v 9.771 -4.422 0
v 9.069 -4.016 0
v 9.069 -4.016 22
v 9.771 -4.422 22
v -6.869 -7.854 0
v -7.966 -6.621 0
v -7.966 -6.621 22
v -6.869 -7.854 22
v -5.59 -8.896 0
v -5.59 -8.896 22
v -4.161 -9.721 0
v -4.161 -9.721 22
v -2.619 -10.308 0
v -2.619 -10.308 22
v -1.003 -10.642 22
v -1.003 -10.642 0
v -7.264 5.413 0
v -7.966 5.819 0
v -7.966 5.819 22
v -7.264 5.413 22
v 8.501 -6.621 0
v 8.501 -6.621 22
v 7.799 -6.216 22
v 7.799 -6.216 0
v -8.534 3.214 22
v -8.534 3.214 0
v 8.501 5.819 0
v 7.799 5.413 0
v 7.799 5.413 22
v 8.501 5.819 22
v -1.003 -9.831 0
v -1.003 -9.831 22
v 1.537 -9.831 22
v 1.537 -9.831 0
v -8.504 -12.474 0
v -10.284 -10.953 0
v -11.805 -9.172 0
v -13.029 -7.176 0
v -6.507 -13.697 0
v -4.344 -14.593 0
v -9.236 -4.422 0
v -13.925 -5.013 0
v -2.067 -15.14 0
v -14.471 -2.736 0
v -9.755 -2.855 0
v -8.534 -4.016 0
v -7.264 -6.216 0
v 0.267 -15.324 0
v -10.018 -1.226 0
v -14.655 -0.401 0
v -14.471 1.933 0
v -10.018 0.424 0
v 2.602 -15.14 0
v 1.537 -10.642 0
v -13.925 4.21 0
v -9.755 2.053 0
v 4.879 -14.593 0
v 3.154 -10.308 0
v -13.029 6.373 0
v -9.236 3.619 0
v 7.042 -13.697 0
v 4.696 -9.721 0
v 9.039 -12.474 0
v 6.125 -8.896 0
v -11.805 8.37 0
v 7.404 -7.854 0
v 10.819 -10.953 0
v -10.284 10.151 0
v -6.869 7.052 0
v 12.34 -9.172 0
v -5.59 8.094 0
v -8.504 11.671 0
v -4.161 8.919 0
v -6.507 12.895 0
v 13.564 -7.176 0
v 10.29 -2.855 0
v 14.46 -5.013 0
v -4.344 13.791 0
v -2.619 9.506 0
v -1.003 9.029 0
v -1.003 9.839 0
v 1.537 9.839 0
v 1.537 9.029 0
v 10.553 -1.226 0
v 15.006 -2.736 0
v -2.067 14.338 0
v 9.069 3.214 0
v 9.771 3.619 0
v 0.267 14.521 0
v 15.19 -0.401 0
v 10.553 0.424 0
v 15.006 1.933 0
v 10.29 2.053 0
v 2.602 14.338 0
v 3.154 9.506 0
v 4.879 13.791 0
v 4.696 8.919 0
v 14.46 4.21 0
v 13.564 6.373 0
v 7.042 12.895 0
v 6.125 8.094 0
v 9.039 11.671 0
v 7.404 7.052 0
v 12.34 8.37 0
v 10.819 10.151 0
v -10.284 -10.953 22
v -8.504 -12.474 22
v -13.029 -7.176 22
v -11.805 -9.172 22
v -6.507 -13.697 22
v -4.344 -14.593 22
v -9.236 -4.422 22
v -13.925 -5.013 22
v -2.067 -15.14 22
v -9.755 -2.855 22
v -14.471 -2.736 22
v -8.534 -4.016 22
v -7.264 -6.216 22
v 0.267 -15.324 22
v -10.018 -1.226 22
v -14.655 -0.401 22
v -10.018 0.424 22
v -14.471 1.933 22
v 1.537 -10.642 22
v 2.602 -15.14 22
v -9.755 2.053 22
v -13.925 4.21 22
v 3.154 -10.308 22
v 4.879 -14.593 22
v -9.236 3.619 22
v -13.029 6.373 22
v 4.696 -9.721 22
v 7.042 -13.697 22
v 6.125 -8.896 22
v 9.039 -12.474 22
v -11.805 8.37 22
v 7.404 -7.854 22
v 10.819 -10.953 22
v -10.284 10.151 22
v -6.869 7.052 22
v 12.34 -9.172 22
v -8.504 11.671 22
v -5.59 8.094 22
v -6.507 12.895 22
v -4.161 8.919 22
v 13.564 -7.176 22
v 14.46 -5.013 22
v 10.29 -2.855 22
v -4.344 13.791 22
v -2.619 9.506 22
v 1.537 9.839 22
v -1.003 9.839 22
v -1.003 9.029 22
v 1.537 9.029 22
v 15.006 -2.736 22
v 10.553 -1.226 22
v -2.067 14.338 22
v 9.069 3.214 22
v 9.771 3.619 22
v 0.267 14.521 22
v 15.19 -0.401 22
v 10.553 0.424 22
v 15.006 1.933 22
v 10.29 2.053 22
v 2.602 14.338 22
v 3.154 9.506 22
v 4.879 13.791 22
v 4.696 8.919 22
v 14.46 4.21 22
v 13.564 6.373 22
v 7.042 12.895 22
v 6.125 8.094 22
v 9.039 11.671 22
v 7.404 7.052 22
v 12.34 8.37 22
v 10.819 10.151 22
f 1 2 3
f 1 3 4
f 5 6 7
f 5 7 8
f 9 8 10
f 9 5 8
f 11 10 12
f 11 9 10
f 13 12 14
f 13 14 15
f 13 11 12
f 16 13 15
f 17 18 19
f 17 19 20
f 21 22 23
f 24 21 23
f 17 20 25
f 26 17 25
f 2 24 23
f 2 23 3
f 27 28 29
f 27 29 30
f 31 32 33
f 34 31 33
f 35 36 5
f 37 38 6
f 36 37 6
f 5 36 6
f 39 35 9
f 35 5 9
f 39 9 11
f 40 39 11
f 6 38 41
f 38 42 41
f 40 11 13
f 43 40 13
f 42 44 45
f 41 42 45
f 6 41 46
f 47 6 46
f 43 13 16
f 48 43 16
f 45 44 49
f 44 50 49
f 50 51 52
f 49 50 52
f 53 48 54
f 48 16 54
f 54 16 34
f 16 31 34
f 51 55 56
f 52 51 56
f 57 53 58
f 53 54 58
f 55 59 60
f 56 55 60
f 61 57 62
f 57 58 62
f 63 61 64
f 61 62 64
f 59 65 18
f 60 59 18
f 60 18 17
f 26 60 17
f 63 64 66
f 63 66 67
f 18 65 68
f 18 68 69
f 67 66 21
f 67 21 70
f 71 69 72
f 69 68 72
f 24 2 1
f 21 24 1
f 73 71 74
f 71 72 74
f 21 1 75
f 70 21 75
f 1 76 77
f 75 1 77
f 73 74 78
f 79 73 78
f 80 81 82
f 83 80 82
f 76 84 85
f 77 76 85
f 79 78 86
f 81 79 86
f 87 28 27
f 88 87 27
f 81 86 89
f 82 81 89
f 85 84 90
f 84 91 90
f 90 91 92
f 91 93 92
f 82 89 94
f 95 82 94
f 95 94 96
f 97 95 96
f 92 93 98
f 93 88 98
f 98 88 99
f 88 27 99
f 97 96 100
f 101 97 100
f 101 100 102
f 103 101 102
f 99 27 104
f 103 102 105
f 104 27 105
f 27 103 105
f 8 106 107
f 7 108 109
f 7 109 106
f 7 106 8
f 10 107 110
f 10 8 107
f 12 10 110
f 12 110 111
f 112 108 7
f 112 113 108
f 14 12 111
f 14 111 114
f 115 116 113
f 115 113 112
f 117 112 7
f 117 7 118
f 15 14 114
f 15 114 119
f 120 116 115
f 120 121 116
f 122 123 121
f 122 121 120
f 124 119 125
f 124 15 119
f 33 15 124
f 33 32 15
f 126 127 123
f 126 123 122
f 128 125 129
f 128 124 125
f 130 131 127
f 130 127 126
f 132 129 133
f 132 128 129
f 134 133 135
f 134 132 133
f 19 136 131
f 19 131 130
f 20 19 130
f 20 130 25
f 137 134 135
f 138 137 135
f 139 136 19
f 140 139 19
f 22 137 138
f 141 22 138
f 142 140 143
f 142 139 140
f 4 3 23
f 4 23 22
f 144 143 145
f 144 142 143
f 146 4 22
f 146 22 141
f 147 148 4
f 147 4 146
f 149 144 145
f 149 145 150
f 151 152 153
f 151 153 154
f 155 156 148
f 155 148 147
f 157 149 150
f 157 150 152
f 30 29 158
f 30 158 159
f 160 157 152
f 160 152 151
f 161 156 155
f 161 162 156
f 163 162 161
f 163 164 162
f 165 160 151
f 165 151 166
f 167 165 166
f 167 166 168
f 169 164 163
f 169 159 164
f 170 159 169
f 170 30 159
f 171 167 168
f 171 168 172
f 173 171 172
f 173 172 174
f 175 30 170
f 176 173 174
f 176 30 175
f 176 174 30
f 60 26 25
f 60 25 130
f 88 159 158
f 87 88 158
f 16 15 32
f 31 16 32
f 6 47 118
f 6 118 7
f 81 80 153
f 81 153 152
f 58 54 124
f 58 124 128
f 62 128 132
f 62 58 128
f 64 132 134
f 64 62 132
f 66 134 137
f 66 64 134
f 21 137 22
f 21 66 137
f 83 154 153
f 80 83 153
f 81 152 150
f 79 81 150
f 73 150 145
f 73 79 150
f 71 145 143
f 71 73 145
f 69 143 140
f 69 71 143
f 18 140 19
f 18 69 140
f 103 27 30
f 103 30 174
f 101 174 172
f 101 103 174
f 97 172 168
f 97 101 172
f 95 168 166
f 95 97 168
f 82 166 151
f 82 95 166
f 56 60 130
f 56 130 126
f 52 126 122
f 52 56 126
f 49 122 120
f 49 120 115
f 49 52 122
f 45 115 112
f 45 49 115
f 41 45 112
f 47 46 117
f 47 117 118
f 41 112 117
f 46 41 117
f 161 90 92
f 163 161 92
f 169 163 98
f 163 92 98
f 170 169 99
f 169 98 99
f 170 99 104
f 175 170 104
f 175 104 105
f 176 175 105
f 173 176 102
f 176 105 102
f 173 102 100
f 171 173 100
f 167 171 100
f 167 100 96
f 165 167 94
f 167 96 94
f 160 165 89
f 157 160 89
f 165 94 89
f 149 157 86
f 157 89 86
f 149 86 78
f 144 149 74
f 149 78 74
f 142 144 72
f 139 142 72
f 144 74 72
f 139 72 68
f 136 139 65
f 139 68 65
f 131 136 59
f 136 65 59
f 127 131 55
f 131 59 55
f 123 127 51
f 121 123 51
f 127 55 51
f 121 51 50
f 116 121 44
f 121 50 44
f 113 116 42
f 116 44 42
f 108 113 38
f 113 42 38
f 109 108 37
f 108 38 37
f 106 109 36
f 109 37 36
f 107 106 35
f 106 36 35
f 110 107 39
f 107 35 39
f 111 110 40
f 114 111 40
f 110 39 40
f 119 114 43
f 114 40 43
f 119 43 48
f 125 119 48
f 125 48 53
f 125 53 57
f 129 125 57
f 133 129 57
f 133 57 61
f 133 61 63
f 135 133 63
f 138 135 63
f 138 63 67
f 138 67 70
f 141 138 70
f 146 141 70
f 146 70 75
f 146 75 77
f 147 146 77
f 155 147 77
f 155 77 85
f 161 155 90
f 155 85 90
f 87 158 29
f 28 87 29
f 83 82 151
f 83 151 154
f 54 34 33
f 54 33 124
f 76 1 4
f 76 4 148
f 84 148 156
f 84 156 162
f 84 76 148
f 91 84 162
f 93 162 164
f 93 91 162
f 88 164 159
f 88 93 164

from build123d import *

# Parameters (mm, degrees)
SKETCH_1_R      = 14.9225
EXTRUDE_1_DEPTH = 22


with BuildPart() as part:
    # Эскиз1 → Бобышка-Вытянуть1 (new body)
    with BuildSketch(Plane.XY):
        with Locations((0.26749168, -0.40123752)):
            Circle(SKETCH_1_R)
        with BuildLine():
            Line((9.068894716, -4.016260259), (9.770849808, -4.421534221))
            ThreePointArc((9.770849808, -4.421534221), (10.58624167, -0.401237512), (9.770849811, 3.619059197))
            Line((9.770849811, 3.619059197), (9.068894716, 3.213785234))
            Line((9.068894716, 3.213785234), (7.798894722, 5.413489748))
            Line((7.798894722, 5.413489748), (8.500849816, 5.81876371))
            ThreePointArc((8.500849816, 5.81876371), (5.426866673, 8.535062117), (1.537491677, 9.839060403))
            Line((1.537491677, 9.839060403), (1.537491677, 9.02851248))
            Line((1.537491677, 9.02851248), (-1.002508323, 9.02851248))
            Line((-1.002508323, 9.02851248), (-1.002508323, 9.839060408))
            ThreePointArc((-1.002508323, 9.839060408), (-4.891883323, 8.535062121), (-7.965866467, 5.818763712))
            Line((-7.965866467, 5.818763712), (-7.26391137, 5.413489747))
            Line((-7.26391137, 5.413489747), (-8.533911366, 3.213785229))
            Line((-8.533911366, 3.213785229), (-9.235866458, 3.61905919))
            ThreePointArc((-9.235866458, 3.61905919), (-10.05125832, -0.401237517), (-9.235866461, -4.421534225))
            Line((-9.235866461, -4.421534225), (-8.533911367, -4.016260262))
            Line((-8.533911367, -4.016260262), (-7.263911371, -6.215964781))
            Line((-7.263911371, -6.215964781), (-7.965866465, -6.621238743))
            ThreePointArc((-7.965866465, -6.621238743), (-4.891883323, -9.337537149), (-1.002508328, -10.641535436))
            Line((-1.002508328, -10.641535436), (-1.002508328, -9.830987512))
            Line((-1.002508328, -9.830987512), (1.537491672, -9.830987512))
            Line((1.537491672, -9.830987512), (1.537491672, -10.641535441))
            ThreePointArc((1.537491672, -10.641535441), (5.426866673, -9.337537153), (8.500849818, -6.621238742))
            Line((8.500849818, -6.621238742), (7.79889472, -6.215964777))
            Line((7.79889472, -6.215964777), (9.068894716, -4.016260259))
        make_face(mode=Mode.SUBTRACT)
    extrude(amount=EXTRUDE_1_DEPTH)


solid = part.part
